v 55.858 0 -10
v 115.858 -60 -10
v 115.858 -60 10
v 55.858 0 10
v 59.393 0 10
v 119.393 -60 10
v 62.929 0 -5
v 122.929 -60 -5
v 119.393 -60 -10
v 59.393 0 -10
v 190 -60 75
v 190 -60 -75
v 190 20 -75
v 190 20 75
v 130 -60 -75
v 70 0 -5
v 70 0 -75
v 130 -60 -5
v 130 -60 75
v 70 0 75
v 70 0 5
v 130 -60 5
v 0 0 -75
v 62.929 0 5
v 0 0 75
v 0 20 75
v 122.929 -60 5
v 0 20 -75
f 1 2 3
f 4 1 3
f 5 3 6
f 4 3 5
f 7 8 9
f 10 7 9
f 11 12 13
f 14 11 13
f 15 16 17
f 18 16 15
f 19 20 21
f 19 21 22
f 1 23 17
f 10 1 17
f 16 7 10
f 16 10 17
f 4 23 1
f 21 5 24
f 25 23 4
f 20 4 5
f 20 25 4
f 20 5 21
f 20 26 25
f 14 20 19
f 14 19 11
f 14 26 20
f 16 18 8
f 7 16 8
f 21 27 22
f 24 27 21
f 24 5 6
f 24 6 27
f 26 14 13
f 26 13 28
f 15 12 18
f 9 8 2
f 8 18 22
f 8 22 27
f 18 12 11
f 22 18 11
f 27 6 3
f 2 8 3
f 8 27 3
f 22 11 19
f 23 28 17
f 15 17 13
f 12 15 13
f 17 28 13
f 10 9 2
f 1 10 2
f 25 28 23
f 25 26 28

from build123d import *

# Parameters (mm, degrees)
EXTRUDE_1_DEPTH          = 75
EXTRUDE_2_REACH          = 181.652
EXTRUDE_3_DEPTH          = 150
EXTRUDE_4_DEPTH          = 14.142135624
CUT_EXTRUDE_2_DEPTH      = 267.643072547
CUT_EXTRUDE_2_DEPTH_BACK = 267.643072547
SKETCH_5_W               = 110.242252028
SKETCH_5_H               = 36.038971429
CUT_EXTRUDE_3_DEPTH      = 265.95282599
CUT_EXTRUDE_3_DEPTH_BACK = 265.95282599
SKETCH_6_W               = 40.565596645
SKETCH_6_H               = 160.869683045


with BuildPart() as part:
    # 草图1 → 凸台-拉伸1 (new, symmetric)
    with BuildSketch(Plane.XY):
        Polygon((0, 0), (70, 0), (120, -50), (210, -50), (210, 20), (0, 20), align=None)
    extrude(amount=EXTRUDE_1_DEPTH, both=True)

    # 凸台-拉伸2: up to this plane
    extrude_2_end = Plane(origin=(0, 0, 75), z_dir=(0, 1, 0))
    # 草图2 → 凸台-拉伸2 (add, up to the surface)
    with BuildSketch(Plane(origin=(85, -85, 0), x_dir=(0, 0, -1), z_dir=(-0.7071067811865562, 0.7071067811865388, 0)), mode=Mode.PRIVATE) as extrude_2_sk1:
        Polygon((5, -44.497474683), (10, -41.997474683), (10, -39.497474683), (-10, -39.497474683), (-10, -41.997474683), (-5, -44.497474683), (-5, -54.497474683), (5, -54.497474683), align=None)
    extrude_2_tool1 = split(extrude(extrude_2_sk1.sketch, amount=EXTRUDE_2_REACH, mode=Mode.PRIVATE), bisect_by=extrude_2_end, keep=Keep.BOTH, mode=Mode.PRIVATE)
    add(extrude_2_tool1.solids().sort_by_distance((117.446559, -52.553441, 0))[0])

    # 草图4 → 凸台-拉伸3 (add)
    with BuildSketch(Plane.XY.offset(75)):
        Polygon((120, -50), (130, -60), (210, -60), (210, -50), align=None)
    extrude(amount=-EXTRUDE_3_DEPTH)

    # 草图2<2> → 凸台-拉伸4 (add)
    with BuildSketch(Plane(origin=(85, -85, 0), x_dir=(0, 0, -1), z_dir=(-0.7071067811865562, 0.7071067811865388, 0))):
        Polygon((5, -44.497474683), (10, -41.997474683), (10, -39.497474683), (-10, -39.497474683), (-10, -41.997474683), (-5, -44.497474683), (-5, -54.497474683), (5, -54.497474683), align=None)
    extrude(amount=-EXTRUDE_4_DEPTH)

    # 草图5 → 切除-拉伸2 (cut, two sides: drawn at the far end of the back side and taken through both)
    with BuildSketch(Plane(origin=(0, 0, -75), x_dir=(-1, 0, 0), z_dir=(0, 0, -1)).offset(-CUT_EXTRUDE_2_DEPTH_BACK)):
        with Locations((-132.449509919, -78.019485715)):
            Rectangle(SKETCH_5_W, SKETCH_5_H)
    extrude(amount=CUT_EXTRUDE_2_DEPTH + CUT_EXTRUDE_2_DEPTH_BACK, mode=Mode.SUBTRACT)

    # 草图6 → 切除-拉伸3 (cut, two sides: drawn at the far end of the back side and taken through both)
    with BuildSketch(Plane.XY.offset(75).offset(-CUT_EXTRUDE_3_DEPTH_BACK)):
        with Locations((210.282798323, -41.689599735)):
            Rectangle(SKETCH_6_W, SKETCH_6_H)
    extrude(amount=CUT_EXTRUDE_3_DEPTH + CUT_EXTRUDE_3_DEPTH_BACK, mode=Mode.SUBTRACT)


solid = part.part
